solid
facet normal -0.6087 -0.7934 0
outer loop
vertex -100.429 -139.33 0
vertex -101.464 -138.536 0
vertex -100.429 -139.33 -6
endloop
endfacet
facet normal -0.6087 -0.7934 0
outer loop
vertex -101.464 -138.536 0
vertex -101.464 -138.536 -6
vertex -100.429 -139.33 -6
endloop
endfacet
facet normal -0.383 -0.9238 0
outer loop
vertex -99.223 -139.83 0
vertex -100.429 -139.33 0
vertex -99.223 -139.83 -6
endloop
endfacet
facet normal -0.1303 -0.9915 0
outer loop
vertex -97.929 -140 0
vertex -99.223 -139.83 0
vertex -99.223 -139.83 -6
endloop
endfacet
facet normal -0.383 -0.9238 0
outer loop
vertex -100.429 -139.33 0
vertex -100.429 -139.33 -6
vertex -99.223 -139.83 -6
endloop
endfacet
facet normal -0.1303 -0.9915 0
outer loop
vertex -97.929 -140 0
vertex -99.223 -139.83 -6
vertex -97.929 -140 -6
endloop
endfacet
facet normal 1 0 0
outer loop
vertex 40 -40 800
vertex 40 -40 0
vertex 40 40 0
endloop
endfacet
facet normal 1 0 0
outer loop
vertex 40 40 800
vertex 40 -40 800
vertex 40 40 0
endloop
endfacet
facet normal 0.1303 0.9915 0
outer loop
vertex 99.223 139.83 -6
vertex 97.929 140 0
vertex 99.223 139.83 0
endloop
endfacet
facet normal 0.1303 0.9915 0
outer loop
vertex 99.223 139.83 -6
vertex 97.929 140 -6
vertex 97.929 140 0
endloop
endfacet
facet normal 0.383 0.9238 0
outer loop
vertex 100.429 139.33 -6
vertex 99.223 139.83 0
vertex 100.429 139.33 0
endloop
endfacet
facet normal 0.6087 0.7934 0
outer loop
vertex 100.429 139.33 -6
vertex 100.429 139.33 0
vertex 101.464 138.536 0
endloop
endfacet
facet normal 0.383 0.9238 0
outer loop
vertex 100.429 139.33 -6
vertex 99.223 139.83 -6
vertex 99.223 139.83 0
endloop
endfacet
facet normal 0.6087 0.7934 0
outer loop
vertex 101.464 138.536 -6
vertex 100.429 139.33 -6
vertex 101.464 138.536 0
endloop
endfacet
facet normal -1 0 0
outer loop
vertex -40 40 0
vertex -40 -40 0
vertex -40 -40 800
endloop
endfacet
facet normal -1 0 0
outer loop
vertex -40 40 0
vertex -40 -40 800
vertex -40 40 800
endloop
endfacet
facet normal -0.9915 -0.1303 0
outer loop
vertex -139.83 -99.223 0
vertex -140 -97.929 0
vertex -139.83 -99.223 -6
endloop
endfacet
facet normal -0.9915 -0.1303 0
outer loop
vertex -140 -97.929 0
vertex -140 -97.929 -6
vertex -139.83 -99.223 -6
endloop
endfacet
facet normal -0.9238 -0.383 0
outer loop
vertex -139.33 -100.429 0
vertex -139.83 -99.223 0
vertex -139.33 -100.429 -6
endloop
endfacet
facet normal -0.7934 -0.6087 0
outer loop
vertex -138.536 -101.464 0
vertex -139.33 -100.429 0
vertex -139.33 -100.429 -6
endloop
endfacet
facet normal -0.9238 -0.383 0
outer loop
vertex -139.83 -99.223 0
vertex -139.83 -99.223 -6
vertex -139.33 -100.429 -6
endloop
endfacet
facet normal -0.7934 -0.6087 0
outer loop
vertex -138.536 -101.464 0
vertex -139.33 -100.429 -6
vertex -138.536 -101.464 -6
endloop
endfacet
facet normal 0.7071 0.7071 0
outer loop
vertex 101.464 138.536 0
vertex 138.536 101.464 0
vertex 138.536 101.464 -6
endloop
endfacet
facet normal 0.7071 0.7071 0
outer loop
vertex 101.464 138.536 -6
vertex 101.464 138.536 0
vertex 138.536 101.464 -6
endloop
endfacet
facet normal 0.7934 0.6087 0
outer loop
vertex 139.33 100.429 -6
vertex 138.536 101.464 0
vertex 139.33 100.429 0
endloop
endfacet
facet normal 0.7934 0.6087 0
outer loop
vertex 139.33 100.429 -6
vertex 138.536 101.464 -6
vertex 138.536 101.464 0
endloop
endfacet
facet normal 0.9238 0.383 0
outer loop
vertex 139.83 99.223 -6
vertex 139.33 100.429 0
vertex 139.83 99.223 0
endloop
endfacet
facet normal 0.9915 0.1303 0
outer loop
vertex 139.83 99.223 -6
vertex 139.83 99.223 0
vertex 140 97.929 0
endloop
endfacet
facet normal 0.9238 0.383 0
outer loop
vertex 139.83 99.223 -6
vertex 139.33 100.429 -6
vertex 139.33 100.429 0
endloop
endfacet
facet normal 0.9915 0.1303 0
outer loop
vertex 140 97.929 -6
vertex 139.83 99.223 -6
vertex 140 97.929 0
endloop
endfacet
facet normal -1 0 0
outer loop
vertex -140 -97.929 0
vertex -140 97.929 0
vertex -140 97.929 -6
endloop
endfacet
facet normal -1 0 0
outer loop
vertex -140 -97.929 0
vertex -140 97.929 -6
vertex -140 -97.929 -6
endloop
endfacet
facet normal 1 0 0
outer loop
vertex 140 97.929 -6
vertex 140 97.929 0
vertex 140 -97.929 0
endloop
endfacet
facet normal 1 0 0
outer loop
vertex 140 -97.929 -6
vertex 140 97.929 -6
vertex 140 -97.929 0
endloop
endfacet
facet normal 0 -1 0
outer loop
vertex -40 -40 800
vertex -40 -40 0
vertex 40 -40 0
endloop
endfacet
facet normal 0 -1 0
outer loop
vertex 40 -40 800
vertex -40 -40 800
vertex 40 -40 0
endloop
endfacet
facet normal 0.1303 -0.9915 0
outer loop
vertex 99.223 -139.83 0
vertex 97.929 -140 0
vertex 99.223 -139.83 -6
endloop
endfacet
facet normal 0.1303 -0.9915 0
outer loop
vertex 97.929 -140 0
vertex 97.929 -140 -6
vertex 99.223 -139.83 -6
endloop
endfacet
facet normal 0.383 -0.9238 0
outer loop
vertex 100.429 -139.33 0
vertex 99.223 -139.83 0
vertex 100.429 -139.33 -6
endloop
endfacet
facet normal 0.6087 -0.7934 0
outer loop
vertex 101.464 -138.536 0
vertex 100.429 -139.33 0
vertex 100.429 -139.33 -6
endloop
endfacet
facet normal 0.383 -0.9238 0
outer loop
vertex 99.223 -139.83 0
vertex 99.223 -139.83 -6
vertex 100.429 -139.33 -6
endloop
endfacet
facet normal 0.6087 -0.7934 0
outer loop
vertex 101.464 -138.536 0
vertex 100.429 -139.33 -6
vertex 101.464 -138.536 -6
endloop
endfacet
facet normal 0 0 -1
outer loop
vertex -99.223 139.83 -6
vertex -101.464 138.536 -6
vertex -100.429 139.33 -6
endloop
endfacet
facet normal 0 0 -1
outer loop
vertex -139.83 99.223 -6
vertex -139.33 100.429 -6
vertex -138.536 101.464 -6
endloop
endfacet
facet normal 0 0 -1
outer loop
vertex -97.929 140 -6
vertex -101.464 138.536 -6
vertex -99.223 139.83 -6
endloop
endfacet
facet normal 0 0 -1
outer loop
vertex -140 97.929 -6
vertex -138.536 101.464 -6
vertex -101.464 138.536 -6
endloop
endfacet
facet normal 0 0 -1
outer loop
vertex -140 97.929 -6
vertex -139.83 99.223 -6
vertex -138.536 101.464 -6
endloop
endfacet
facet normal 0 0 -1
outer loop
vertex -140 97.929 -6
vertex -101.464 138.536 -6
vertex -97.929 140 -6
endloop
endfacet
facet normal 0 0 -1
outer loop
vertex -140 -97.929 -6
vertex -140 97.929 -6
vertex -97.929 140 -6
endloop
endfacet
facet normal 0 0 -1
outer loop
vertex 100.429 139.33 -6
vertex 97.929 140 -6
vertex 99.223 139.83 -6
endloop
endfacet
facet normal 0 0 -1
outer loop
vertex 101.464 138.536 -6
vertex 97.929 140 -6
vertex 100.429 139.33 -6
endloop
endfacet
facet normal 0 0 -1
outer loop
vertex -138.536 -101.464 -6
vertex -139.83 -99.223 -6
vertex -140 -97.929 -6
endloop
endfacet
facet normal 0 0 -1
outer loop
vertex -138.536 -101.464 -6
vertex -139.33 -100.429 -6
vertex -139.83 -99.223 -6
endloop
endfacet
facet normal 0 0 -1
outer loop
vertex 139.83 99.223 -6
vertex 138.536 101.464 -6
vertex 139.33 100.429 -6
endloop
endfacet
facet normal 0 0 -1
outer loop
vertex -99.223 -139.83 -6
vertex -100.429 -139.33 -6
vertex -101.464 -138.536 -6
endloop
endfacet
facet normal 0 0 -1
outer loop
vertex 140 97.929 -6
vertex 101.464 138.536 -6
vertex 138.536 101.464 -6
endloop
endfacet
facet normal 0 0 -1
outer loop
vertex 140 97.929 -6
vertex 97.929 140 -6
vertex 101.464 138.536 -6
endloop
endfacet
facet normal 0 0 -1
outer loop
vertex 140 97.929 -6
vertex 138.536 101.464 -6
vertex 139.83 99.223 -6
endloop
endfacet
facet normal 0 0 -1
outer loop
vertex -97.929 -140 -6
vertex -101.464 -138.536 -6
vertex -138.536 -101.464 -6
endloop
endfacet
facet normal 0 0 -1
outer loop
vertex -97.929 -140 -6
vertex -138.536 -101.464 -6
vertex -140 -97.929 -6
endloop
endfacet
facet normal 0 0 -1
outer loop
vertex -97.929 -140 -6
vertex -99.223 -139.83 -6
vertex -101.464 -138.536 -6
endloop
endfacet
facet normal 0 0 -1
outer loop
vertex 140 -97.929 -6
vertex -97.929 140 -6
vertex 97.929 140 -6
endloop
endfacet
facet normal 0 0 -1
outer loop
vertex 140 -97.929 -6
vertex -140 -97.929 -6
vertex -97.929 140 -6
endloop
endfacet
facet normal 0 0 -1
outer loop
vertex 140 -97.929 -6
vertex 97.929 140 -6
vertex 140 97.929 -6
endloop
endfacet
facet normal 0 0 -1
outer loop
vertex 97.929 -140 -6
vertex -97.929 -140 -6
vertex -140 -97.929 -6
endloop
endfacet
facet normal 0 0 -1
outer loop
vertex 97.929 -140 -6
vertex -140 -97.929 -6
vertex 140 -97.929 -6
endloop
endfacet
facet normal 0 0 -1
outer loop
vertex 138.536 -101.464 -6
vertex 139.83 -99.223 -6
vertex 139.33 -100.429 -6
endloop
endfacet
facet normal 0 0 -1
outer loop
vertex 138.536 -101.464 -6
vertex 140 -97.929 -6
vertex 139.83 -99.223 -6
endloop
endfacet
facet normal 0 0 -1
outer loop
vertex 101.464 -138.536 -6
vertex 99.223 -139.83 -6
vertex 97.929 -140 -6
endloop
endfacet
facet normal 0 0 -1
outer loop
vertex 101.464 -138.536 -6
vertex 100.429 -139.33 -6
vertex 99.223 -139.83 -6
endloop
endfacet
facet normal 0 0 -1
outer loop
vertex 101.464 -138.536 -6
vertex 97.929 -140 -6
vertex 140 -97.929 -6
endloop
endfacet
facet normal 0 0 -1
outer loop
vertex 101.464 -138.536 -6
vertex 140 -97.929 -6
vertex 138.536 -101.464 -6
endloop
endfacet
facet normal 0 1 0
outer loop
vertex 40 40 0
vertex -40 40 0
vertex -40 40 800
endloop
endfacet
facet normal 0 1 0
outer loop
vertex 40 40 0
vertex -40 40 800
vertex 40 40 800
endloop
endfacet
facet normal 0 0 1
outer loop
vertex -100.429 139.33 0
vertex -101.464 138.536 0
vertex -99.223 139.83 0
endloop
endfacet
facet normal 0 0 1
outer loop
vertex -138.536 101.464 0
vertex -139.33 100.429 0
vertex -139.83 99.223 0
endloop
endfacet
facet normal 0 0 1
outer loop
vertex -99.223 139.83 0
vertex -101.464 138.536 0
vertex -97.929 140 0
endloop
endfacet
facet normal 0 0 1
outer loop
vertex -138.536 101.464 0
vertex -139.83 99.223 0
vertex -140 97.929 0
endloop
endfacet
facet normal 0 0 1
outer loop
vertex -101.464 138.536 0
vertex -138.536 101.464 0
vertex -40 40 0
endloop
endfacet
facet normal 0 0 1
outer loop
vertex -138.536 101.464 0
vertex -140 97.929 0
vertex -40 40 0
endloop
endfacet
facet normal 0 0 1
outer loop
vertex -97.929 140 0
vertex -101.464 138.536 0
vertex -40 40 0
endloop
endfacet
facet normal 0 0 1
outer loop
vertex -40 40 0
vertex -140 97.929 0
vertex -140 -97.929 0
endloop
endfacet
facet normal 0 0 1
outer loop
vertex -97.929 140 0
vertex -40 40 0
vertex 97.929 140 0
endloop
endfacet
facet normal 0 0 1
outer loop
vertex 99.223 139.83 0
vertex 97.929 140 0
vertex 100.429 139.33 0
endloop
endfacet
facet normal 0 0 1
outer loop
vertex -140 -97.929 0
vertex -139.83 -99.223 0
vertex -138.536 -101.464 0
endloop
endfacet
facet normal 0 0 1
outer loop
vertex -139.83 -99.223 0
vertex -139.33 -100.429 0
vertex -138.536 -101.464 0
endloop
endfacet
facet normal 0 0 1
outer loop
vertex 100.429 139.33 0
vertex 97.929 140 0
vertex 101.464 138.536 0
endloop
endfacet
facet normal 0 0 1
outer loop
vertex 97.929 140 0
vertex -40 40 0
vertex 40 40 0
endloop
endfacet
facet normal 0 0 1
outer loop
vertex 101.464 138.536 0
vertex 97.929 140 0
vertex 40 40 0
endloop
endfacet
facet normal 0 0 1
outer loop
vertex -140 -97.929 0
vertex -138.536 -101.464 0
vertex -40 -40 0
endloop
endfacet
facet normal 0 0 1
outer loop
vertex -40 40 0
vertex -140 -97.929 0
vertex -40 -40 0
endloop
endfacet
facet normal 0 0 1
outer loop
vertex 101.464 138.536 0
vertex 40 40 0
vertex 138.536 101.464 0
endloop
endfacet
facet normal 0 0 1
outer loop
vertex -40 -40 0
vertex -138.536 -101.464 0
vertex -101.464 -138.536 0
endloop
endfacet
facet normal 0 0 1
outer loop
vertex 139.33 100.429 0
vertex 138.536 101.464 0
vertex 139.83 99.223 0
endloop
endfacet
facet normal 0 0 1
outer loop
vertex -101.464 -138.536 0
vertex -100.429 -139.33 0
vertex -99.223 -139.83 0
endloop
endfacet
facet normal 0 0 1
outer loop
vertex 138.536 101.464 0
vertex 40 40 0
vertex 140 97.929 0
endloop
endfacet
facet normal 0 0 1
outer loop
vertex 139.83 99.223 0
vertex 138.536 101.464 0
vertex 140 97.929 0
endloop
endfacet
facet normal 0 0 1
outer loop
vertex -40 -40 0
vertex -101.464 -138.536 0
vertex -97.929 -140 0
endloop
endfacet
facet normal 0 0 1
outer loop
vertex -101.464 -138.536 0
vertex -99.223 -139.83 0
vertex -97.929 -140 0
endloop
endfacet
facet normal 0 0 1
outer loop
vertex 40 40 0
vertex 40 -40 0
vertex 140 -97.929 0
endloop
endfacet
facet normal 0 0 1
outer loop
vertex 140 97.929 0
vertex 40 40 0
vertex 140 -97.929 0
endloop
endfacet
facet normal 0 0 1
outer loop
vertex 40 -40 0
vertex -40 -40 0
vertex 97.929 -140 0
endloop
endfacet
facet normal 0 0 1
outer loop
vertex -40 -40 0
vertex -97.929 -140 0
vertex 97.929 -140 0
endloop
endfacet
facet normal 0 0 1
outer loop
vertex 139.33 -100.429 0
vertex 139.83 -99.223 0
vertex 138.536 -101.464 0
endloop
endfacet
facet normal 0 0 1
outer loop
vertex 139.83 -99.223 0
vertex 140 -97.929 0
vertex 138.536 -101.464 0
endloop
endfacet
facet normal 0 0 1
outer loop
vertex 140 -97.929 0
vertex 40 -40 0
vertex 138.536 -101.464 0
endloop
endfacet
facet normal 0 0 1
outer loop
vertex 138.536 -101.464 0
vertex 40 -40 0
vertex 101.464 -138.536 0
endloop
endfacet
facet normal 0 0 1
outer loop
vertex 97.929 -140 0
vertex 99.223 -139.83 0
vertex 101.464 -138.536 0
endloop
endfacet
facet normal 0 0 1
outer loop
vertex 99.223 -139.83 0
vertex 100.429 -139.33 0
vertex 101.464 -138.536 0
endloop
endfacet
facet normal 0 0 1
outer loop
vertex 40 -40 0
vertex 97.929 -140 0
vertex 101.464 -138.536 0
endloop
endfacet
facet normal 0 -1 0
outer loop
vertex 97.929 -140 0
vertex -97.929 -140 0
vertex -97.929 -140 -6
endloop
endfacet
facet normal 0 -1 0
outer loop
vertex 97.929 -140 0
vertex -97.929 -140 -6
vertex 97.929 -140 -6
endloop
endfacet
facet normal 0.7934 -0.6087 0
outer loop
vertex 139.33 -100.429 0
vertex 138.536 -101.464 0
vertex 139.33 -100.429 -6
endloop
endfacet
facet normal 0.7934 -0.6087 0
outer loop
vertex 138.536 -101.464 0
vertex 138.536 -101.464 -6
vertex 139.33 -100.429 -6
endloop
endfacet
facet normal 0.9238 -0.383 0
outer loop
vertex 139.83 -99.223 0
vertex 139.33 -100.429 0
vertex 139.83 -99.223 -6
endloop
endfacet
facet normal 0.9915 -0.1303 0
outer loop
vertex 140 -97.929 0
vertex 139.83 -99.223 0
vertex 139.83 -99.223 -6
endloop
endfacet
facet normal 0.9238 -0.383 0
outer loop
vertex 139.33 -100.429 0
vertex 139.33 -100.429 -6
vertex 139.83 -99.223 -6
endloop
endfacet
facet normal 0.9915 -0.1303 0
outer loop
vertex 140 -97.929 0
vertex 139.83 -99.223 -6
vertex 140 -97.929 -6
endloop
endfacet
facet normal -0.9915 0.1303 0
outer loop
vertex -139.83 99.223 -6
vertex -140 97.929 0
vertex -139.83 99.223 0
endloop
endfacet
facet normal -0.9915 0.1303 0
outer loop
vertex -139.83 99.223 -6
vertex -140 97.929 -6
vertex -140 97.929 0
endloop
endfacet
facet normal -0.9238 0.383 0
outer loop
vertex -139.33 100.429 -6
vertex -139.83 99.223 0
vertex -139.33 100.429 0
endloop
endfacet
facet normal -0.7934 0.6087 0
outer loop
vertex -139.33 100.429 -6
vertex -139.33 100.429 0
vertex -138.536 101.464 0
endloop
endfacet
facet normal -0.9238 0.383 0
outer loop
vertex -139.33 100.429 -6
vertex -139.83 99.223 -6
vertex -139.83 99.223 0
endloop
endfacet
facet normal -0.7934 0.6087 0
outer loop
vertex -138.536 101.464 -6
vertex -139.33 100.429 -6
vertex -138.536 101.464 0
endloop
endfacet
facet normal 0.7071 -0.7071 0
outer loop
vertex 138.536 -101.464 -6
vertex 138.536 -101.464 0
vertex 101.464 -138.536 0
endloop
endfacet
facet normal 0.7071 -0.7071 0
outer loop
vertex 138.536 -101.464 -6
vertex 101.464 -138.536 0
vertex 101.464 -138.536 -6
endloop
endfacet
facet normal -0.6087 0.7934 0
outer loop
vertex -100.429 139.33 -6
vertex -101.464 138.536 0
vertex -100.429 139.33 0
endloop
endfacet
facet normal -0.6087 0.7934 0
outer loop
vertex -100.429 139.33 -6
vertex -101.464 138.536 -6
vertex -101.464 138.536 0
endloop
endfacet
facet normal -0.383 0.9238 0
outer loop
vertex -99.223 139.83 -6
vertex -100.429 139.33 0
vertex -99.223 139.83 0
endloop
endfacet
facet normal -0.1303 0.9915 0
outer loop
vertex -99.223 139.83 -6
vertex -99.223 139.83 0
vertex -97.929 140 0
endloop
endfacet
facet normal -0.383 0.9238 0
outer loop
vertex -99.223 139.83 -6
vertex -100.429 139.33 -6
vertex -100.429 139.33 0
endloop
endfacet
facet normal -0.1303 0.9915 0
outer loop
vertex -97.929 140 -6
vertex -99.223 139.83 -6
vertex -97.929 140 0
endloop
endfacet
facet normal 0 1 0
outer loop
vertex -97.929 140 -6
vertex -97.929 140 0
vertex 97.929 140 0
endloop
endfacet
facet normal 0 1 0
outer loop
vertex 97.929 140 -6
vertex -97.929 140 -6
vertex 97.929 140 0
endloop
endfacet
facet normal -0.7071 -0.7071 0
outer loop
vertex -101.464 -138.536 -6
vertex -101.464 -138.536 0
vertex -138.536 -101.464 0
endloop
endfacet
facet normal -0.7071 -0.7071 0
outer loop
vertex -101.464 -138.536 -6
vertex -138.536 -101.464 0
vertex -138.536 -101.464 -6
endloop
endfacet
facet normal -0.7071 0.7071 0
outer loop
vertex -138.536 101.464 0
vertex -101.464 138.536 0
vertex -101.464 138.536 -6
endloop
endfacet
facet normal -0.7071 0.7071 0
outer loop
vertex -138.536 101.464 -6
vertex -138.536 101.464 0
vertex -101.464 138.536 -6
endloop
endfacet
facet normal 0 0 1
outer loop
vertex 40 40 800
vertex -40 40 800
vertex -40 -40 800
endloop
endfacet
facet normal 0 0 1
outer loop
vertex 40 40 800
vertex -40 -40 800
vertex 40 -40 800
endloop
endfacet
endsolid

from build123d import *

# Parameters (mm, degrees)
F0_W     = 80
F0_H     = 80
F1_DEPTH = 800
F2_W     = 280
F2_H     = 280
F3_DEPTH = 6
F4_SIZE  = 40
F5_R     = 5


with BuildPart() as f1:
    # F0 (on Top) → F1 (new body)
    with BuildSketch(Plane.XY):
        Rectangle(F0_W, F0_H)
    extrude(amount=F1_DEPTH)

    # F2 (on face) → F3 (join)
    with BuildSketch(Plane(origin=(0, 0, 0), x_dir=(1, 0, 0), z_dir=(0, 0, -1))):
        Rectangle(F2_W, F2_H)
    extrude(amount=F3_DEPTH)

    # F4
    f4_edges = [f1.edges().sort_by_distance(p)[0] for p in [
        (140, -140, -3),
        (140, 140, -3),
        (-140, 140, -3),
        (-140, -140, -3),
    ]]
    chamfer(f4_edges, length=F4_SIZE)

    # F5
    f5_edges = [f1.edges().sort_by_distance(p)[0] for p in [
        (140, -100, -3),
        (100, -140, -3),
        (140, 100, -3),
        (100, 140, -3),
        (-100, 140, -3),
        (-140, 100, -3),
        (-100, -140, -3),
        (-140, -100, -3),
    ]]
    fillet(f5_edges, radius=F5_R)


solid = f1.part
